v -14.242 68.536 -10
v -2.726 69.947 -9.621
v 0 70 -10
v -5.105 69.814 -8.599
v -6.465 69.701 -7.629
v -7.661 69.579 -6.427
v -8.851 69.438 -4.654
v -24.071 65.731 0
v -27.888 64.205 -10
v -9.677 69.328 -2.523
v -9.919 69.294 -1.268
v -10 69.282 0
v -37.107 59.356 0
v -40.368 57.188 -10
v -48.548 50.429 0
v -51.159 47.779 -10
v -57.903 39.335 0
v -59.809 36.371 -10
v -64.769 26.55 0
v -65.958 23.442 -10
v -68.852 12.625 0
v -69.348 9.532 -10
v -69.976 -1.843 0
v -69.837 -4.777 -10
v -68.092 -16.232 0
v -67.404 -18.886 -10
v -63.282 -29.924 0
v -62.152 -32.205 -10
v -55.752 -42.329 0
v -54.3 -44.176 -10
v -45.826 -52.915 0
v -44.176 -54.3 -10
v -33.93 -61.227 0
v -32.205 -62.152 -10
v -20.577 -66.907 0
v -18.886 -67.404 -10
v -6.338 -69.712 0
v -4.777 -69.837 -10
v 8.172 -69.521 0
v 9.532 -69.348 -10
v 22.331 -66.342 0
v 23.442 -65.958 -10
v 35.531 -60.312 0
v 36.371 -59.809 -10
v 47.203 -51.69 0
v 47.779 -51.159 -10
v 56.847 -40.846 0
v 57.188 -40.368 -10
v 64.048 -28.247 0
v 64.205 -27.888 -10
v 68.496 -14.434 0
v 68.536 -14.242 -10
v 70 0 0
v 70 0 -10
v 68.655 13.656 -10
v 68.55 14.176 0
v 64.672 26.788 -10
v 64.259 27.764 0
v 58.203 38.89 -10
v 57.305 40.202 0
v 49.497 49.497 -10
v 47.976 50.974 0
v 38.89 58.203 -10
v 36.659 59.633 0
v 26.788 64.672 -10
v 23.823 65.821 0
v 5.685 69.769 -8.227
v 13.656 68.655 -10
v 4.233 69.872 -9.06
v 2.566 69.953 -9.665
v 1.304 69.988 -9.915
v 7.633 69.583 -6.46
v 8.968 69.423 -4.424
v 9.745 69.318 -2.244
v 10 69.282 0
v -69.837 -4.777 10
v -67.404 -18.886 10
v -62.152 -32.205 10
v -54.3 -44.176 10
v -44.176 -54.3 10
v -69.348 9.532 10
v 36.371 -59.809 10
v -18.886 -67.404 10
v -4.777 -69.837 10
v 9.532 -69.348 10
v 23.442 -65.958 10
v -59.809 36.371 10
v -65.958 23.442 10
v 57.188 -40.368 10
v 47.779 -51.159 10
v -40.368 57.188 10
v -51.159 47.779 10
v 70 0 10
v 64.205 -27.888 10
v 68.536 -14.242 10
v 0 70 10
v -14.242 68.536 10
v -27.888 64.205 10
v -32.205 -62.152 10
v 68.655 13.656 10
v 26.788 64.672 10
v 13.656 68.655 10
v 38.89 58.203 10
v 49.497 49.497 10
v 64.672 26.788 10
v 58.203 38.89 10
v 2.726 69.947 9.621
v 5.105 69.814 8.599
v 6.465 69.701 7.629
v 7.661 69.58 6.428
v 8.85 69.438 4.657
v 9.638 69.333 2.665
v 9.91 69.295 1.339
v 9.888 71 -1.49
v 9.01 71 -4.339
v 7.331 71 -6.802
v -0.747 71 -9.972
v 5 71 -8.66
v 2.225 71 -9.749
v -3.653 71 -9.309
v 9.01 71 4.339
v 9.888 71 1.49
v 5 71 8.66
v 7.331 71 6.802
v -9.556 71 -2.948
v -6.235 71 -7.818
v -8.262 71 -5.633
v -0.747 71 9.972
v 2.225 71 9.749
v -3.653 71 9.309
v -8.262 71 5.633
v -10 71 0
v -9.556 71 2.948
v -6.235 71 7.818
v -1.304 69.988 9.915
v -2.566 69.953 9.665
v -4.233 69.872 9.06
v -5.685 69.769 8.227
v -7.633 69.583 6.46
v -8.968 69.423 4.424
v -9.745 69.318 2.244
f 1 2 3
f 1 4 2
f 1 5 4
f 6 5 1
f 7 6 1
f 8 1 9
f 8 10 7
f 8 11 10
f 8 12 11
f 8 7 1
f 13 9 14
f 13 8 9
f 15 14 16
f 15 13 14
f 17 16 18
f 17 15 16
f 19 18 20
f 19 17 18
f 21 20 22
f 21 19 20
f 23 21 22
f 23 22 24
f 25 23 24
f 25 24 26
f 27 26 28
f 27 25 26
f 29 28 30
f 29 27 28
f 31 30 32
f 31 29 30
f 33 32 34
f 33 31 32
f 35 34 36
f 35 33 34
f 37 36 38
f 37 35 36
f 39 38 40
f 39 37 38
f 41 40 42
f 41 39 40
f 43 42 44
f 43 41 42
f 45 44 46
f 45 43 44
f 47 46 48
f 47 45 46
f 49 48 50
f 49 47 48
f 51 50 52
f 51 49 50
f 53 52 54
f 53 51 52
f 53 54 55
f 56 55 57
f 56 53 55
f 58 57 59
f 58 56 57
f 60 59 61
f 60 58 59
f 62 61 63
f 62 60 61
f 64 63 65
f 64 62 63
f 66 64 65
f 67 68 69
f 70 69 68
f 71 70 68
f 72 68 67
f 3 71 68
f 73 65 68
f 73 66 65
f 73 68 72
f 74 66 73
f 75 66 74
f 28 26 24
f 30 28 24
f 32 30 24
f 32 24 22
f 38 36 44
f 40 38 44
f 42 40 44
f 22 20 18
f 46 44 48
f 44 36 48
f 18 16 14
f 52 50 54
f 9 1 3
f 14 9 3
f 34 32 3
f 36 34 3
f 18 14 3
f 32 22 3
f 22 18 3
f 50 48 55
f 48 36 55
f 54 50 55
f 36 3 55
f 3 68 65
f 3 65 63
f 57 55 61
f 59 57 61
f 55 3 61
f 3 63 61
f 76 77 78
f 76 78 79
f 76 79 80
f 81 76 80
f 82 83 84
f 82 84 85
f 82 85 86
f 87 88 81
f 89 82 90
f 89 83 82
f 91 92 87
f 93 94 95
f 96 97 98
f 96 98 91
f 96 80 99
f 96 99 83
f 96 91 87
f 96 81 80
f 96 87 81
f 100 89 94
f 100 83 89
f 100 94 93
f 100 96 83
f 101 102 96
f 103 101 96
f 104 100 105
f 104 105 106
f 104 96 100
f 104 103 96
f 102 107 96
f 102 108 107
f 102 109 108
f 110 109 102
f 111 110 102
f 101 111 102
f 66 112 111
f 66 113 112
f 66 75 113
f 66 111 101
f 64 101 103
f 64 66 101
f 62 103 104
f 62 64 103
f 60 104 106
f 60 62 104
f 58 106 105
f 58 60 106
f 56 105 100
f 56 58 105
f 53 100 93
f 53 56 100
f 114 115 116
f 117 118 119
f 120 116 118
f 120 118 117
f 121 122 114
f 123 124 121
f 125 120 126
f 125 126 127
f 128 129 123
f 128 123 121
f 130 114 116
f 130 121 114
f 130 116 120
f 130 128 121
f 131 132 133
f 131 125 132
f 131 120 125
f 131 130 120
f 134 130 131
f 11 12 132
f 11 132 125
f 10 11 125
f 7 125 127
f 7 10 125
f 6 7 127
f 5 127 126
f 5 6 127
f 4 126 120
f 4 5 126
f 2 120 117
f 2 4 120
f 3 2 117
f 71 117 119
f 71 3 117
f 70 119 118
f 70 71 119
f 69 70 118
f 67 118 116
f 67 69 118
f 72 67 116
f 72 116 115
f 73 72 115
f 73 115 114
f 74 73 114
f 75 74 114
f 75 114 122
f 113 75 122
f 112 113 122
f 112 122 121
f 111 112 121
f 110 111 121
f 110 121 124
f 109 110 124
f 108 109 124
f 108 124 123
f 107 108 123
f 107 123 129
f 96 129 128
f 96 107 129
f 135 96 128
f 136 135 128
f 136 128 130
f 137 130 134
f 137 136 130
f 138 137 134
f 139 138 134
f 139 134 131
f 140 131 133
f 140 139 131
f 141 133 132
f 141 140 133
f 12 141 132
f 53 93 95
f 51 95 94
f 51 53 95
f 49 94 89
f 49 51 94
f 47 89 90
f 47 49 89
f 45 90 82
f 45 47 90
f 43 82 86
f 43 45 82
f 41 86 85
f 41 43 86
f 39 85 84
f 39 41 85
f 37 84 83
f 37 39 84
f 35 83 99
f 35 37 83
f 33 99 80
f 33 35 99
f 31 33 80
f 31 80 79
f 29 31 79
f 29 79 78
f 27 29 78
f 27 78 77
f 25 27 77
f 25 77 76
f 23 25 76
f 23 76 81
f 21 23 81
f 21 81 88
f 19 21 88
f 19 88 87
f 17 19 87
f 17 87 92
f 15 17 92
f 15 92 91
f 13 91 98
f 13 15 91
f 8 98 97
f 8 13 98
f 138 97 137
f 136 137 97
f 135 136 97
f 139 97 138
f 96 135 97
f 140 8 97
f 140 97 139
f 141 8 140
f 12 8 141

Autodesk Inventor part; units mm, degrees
ref_plane "YZ Plane" through (0, 0, 0) normal (1, 0, 0) x (0, 1, 0)
ref_plane "XZ Plane" through (0, 0, 0) normal (0, 1, 0) x (-1, 0, 0)
ref_plane "XY Plane" through (0, 0, 0) normal (0, 0, 1) x (1, 0, 0)
sketch "Эскиз3" plane through (0, 0, 0) normal (0, 0, 1) x (1, 0, 0)
  circle A0 centre (0, 0) radius 70
  dimension "d1" = 140
extrude "Выдавливание1" add sketch "Эскиз3" along normal mid plane 20
sketch "Эскиз4" plane through (0, 0, 0) normal (0, 1, 0) x (-1, 0, 0)
  circle A0 centre (0, 0) radius 10
  dimension "d4" = 20
extrude "Выдавливание2" add sketch "Эскиз4" along normal blind 71
equation "\"d1\" = hip_diam"
equation "\"d4\" = joint_width"
equation "\"hip_diam\" = 140"
equation "\"joint_width\" = 20"
properties part number "ч ASY human dummy 01"
